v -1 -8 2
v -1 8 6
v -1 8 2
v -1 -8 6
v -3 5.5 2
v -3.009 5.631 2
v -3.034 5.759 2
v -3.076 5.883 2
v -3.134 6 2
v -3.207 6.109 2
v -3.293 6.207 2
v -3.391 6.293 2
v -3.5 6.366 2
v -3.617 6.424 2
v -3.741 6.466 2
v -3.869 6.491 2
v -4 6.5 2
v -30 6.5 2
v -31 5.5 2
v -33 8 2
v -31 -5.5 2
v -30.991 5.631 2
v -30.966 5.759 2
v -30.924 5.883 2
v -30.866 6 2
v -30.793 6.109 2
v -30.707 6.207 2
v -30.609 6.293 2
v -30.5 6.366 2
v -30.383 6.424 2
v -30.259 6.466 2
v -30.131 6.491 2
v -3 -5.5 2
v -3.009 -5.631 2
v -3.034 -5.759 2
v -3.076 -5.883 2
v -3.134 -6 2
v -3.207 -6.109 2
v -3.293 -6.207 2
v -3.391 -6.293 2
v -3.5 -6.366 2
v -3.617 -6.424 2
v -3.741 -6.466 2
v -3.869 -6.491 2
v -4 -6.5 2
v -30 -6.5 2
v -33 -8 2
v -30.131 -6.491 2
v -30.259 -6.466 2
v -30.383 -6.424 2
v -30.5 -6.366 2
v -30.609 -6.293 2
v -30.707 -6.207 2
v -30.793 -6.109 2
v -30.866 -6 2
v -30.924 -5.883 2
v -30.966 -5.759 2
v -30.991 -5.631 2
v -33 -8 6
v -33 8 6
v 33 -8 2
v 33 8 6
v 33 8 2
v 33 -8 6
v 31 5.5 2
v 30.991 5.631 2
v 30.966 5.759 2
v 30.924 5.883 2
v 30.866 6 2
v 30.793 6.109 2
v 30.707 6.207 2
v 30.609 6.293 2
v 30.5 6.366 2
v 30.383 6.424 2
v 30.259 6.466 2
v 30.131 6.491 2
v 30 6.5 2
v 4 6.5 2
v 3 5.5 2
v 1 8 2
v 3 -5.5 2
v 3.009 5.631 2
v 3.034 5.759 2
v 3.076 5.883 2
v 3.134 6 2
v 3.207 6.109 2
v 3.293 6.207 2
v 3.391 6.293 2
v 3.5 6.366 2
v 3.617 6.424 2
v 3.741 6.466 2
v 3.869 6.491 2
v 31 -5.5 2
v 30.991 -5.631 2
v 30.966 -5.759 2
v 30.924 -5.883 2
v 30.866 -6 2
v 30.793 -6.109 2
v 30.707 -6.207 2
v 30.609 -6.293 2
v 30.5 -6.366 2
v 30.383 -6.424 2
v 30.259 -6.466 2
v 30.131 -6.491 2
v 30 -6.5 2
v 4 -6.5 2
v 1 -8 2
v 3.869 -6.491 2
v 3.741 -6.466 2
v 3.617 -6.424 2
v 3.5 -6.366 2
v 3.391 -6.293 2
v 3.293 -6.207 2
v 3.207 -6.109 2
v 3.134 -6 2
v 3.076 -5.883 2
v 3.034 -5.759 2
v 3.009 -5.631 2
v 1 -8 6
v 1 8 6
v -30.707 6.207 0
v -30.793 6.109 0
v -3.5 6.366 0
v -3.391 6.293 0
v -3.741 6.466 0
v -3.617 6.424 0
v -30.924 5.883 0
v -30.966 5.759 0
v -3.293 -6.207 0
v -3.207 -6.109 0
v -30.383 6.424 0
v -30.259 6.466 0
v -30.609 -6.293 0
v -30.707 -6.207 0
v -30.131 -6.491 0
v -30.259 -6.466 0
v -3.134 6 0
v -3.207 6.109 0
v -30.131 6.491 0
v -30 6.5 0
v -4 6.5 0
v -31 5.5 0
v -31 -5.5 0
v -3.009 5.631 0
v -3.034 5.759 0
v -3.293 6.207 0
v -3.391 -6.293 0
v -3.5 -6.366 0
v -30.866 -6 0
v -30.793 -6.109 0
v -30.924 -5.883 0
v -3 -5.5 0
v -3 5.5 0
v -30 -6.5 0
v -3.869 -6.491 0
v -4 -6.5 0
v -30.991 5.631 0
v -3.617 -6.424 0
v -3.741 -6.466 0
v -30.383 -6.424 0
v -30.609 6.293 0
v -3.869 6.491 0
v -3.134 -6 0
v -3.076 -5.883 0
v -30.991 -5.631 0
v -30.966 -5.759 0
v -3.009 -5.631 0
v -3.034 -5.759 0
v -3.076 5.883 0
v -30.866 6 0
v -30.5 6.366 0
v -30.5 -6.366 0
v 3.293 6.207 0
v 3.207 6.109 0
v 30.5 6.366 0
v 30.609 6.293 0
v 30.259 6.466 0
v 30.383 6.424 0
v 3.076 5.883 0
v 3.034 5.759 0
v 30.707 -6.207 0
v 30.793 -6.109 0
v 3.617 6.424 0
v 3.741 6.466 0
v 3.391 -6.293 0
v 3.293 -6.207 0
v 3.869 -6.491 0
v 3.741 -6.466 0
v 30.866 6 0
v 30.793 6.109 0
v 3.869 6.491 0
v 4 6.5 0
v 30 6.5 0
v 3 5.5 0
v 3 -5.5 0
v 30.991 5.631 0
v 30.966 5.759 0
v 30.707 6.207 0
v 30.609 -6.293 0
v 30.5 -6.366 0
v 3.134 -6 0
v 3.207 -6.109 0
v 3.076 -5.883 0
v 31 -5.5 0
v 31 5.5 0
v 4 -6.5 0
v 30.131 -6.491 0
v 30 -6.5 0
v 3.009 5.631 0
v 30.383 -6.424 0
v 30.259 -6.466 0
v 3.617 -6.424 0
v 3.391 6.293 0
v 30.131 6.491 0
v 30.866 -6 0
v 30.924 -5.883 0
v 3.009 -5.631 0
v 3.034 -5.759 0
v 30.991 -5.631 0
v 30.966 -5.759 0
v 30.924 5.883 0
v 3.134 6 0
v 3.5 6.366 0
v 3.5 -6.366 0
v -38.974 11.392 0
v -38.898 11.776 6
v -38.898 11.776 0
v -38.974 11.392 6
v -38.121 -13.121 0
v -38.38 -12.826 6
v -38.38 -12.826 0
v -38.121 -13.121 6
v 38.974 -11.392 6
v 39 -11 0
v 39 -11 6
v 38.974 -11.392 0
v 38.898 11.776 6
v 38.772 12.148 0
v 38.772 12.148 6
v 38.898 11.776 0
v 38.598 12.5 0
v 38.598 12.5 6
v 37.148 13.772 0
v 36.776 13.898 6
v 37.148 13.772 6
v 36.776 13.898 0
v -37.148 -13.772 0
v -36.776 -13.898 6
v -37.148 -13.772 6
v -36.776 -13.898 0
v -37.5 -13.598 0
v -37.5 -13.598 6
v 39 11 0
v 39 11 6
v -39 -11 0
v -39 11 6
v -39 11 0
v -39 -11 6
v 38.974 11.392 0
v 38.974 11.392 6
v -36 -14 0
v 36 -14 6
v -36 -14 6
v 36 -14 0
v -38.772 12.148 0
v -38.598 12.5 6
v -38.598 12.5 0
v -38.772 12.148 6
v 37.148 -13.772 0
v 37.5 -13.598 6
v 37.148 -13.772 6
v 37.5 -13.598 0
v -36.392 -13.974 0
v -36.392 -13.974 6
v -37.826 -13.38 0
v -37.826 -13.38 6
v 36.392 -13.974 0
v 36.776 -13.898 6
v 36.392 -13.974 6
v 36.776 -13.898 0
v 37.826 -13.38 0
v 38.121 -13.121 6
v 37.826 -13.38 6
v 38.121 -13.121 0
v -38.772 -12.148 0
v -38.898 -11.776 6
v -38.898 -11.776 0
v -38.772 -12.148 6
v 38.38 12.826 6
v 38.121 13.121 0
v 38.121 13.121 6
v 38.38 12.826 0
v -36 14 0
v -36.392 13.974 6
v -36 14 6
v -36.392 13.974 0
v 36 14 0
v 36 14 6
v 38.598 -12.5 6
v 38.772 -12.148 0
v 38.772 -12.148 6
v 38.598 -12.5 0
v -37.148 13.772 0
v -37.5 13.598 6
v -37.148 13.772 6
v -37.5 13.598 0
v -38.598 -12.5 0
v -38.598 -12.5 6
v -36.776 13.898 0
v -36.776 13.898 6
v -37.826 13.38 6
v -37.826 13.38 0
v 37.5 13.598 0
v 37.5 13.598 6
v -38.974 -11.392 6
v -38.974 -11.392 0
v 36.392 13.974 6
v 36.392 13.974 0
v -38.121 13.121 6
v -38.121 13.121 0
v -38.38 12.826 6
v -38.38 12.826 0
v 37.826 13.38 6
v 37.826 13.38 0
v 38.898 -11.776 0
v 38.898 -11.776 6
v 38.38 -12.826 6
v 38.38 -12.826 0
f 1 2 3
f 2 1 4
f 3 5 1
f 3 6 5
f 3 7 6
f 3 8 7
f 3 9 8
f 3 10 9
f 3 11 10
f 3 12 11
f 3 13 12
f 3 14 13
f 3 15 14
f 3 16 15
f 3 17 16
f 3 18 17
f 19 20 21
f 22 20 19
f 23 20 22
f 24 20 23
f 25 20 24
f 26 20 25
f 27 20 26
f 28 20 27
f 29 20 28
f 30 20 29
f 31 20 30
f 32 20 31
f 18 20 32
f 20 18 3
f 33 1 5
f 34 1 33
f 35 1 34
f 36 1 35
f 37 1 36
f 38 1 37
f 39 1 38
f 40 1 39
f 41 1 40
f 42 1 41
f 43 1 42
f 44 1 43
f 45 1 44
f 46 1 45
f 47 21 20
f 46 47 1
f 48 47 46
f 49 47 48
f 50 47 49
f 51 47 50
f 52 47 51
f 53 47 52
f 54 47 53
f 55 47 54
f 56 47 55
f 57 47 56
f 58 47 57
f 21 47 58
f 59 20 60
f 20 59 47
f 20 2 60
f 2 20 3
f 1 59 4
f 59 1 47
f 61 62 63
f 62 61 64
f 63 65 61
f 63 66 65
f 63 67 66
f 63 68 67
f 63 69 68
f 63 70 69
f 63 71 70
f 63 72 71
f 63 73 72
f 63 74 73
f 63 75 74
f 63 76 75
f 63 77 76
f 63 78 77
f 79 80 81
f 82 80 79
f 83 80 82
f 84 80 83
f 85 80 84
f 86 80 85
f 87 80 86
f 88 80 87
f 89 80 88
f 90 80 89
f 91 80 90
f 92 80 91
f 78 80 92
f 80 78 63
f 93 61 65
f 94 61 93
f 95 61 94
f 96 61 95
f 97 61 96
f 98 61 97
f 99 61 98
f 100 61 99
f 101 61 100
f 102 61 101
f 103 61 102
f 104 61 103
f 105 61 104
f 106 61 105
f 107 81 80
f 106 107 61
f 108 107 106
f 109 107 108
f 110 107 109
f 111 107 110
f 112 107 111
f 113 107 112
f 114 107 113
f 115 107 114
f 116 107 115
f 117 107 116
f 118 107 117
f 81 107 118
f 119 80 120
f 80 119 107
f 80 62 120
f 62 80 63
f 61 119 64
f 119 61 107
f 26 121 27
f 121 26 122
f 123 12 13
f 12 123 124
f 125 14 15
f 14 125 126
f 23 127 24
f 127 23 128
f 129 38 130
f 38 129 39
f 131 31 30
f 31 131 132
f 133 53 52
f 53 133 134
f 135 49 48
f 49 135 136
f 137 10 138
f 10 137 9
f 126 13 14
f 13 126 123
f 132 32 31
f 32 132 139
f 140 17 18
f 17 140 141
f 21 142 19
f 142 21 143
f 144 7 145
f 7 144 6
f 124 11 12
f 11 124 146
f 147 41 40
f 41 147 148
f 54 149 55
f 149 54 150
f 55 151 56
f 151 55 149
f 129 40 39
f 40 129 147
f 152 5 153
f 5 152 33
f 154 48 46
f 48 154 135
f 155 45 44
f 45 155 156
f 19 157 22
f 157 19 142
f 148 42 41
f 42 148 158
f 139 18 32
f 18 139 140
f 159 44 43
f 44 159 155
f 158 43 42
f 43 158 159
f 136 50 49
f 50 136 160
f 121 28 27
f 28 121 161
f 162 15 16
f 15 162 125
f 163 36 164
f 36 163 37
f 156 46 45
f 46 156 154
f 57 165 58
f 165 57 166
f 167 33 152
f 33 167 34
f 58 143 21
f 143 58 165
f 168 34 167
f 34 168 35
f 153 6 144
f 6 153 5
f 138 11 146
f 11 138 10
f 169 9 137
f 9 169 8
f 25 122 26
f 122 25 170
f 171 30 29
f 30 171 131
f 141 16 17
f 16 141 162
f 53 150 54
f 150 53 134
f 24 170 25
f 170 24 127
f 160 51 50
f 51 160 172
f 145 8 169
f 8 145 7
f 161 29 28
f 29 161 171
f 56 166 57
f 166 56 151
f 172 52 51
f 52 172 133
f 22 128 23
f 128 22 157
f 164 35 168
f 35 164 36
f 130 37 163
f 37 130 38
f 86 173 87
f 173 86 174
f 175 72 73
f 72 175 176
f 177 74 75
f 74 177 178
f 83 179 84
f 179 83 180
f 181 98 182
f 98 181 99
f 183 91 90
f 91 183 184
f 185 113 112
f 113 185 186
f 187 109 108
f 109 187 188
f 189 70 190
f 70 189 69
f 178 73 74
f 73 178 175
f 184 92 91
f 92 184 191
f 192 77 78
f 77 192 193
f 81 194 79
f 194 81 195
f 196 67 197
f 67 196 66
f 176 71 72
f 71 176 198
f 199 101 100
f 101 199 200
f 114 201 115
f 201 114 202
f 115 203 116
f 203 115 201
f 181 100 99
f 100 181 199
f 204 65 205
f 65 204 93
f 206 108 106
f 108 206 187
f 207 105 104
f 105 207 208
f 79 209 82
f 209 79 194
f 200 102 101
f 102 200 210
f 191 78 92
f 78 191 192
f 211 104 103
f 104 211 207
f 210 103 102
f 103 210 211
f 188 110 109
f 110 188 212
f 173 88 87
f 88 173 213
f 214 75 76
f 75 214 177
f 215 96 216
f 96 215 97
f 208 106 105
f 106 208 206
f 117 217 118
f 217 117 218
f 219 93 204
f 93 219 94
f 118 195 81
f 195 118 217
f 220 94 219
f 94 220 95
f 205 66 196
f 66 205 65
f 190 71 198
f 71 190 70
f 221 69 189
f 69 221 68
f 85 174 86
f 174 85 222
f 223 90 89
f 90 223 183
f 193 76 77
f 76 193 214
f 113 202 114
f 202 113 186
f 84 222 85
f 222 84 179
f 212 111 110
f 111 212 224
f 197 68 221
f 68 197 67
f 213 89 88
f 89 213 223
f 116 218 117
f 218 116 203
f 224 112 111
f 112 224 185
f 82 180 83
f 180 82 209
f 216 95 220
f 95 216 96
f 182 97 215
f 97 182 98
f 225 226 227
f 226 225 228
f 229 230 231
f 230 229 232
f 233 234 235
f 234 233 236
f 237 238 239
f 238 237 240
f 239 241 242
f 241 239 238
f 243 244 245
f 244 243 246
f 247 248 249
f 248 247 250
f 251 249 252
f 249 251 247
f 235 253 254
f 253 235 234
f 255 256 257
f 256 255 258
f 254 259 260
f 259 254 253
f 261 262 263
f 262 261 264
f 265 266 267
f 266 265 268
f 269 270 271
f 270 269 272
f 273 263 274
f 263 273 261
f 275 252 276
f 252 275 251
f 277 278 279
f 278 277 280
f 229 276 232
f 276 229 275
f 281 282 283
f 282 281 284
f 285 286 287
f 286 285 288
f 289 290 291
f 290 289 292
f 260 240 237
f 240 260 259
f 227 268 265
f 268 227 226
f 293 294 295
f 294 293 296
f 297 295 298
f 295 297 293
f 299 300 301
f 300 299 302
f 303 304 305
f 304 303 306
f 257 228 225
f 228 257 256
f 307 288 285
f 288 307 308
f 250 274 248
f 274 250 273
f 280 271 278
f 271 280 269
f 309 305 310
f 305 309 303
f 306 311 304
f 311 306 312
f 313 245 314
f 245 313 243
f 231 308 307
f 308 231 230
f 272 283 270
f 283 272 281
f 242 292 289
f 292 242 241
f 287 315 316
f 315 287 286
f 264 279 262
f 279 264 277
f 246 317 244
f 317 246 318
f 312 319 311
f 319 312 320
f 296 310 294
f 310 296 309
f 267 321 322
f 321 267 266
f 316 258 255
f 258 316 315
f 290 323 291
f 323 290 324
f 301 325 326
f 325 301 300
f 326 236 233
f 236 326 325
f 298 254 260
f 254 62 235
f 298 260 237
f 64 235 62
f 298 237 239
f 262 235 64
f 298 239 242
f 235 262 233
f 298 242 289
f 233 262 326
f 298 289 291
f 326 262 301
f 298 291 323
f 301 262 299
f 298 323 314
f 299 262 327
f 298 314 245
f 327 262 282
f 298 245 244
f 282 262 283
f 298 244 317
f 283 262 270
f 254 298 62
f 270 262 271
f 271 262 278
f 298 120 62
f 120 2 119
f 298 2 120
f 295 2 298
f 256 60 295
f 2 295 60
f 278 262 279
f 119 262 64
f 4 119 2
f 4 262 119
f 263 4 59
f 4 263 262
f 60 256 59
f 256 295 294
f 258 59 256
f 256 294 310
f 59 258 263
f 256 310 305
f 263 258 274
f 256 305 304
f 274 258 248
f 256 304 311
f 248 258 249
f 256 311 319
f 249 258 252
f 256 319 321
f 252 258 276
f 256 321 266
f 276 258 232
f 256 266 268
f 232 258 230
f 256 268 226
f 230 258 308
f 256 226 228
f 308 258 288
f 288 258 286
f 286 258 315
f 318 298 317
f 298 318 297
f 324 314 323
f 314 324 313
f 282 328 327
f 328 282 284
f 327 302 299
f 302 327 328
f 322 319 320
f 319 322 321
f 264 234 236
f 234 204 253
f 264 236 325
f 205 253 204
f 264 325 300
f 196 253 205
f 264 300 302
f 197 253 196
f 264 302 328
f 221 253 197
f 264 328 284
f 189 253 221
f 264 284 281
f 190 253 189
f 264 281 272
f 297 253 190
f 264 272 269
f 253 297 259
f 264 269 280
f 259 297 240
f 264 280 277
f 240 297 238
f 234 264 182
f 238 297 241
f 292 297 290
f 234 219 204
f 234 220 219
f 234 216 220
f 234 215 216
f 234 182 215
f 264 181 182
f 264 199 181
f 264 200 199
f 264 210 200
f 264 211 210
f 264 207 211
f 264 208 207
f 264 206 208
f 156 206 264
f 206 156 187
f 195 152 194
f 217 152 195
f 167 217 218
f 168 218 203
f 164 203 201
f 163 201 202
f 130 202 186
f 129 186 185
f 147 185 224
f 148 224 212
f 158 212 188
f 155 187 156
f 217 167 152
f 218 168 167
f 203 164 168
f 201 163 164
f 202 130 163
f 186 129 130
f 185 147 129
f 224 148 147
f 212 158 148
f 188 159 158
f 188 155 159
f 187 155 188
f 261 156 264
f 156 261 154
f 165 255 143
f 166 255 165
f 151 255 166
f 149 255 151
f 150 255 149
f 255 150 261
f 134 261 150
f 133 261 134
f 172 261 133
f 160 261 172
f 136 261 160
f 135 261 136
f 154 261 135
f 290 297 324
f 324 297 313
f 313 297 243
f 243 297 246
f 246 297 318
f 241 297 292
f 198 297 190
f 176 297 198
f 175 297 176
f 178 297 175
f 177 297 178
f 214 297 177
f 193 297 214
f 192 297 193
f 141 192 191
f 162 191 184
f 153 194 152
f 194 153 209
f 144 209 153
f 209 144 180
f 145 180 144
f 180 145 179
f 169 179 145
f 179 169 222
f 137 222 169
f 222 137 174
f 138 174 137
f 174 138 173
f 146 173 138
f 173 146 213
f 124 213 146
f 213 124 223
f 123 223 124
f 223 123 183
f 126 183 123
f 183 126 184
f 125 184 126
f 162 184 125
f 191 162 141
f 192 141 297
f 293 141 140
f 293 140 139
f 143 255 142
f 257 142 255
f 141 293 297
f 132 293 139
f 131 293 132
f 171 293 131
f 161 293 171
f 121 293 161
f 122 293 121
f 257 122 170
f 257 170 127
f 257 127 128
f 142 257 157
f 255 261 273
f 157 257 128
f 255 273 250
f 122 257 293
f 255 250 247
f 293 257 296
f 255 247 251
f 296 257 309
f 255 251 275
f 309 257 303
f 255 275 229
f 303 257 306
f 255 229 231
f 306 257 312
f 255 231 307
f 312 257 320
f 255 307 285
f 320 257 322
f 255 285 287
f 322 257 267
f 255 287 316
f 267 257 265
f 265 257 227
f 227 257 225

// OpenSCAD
// file: parameters.scad
// ============================================
// MODULAR CABLE ORGANIZER - SHARED PARAMETERS
// ============================================
// All dimensions in mm - include this in all files
// ============================================

$fn = 48;

// === TOLERANCES ===
clearance = 0.3;
port_clearance = 0.1;  // Extra clearance for port openings (reduced - 0.2 was too loose for USB-C)
wall = 1.6;

// === SLOT DIMENSIONS (2:1 aspect ratio) - scaled to 2/3 ===
slot_width = 32;  // Standard wide slot for larger connectors
slot_width_narrow = 16;  // Narrow slot for compact connectors (USB-C, micro-USB, USB-A, Lightning, 3.5mm)
slot_height = 16;  // Height is same for both wide and narrow
slot_depth = 4;  // Reduced from 6mm - less frame depth needed

// === FRAME STRUCTURE ===
frame_wall = 2.0;   // Wall between slots - 6 layers @ 0.4mm nozzle for strength
frame_border = 6;  // Increased by 10mm for mounting holes with countersink
frame_back = 2;     // Slightly thicker for snap catch strength
mount_hole_dia = 4;  // M4 mounting holes (changed from M3 for common screw sizes)
countersink_dia = 8;  // Diameter of countersink for M4 screw heads
countersink_depth = 2;  // Depth of countersink

// === DEFAULT GRID (can be overridden in individual files) ===
grid_cols = 2;
grid_rows = 2;

// === INSERT BASE DIMENSIONS ===
insert_width = slot_width - (2 * clearance);
insert_height = slot_height - (2 * clearance);
insert_base_depth = slot_depth - 0.5;

// === NARROW INSERT BASE DIMENSIONS ===
insert_width_narrow = slot_width_narrow - (2 * clearance);
insert_height_narrow = slot_height - (2 * clearance);

// === INSERT BODY (protrudes from frame) ===
insert_body_width = insert_width - 4;
insert_body_height = insert_height - 3;
insert_body_depth = 15.5;  // Standardized depth (USB-B 15.26mm + 0.25mm buffer) - all inserts same height
insert_top_thick = 1.5;  // Top platform thickness

// === NARROW INSERT BODY (protrudes from frame) ===
insert_body_width_narrow = insert_width_narrow - 4;
insert_body_height_narrow = insert_height_narrow - 3;

// === SNAP TABS (on neck/body - catch on back plate) ===
snap_tab_width = 4;
snap_tab_protrude = 1.2;  // How far tab sticks out from body
snap_tab_thick = 1.5;     // Z thickness of tab
snap_tab_offset = 2.2;      // Distance from base to tab bottom on insert (increased to clear frame)

// === CONNECTOR PORT DIMENSIONS & BODY DEPTHS ===
// Port dimensions from reference blueprints
// Body depths sized to match typical male connector lengths

// USB-C: 8.4 x 2.6mm, male connector ~9mm
usbc_w = 8.4;
usbc_h = 2.6;
usbc_r = 1.0;
usbc_body_depth = 15.5;  // Standardized depth (USB-B 15.26mm + 0.25mm buffer)
// NO RETENTION RIBS for USB-C (removed per user request)

// USB-A: 13.0 x 4.5mm (standard male USB-A height)
usba_w = 13.0;
usba_h = 4.5;  // Match actual male USB-A height
usba_r = 0.5;
usba_body_depth = 15.5;  // Standardized depth (USB-B 15.26mm + 0.25mm buffer)
usba_retention_rib_depth = 5.0;  // Distance from front (moved back 1mm so ribs don't break)
usba_retention_rib_size = 0.15;  // How far ribs protrude inward

// USB Mini: 6.9 x 3.0mm, male connector ~9mm
usb_mini_w = 6.9;
usb_mini_h = 3.0;
usb_mini_r = 0.5;
usb_mini_body_depth = 15.5;  // Standardized depth (USB-B 15.26mm + 0.25mm buffer)
usb_mini_retention_rib_depth = 3.5;  // Distance from front where retention ribs start
usb_mini_retention_rib_size = 0.125;  // Reduced to half (was 0.25)

// USB Micro-B: 7.4 x 1.8mm (wider to fit corners of trapezoid)
usb_micro_w = 7.4;  // Increased width for corners
usb_micro_h = 1.8;
usb_micro_r = 0.3;
usb_micro_body_depth = 15.5;  // Standardized depth (USB-B 15.26mm + 0.25mm buffer)
usb_micro_retention_rib_depth = 4.5;  // Distance from front (moved back 1mm so ribs don't break)
usb_micro_retention_rib_size = 0.125;  // How far ribs protrude inward

// USB-B: 8.75 x 7.78mm (standard male USB-B height)
usb_b_w = 8.75;  // Width at bottom (wider)
usb_b_h = 7.78;  // Match actual male USB-B height (reduced from 7.9)
usb_b_r = 0.6;   // Corner radius
usb_b_top_inset = 0.9;  // How much narrower the top is (creates trapezoid shape)
usb_b_body_depth = 15.5;  // Standardized depth (15.26mm connector + 0.25mm buffer)
usb_b_retention_rib_depth = 5.5;  // Distance from front (moved back 1mm so ribs don't break)
usb_b_retention_rib_size = 0.15;  // How far ribs protrude inward

// Lightning: 7.6 x 1.5mm, male connector ~8mm (measured from actual connector)
lightning_w = 7.6;
lightning_h = 1.5;
lightning_r = 0.5;
lightning_body_depth = 15.5;  // Standardized depth (USB-B 15.26mm + 0.25mm buffer)
lightning_retention_rib_depth = 4.0;  // Distance from front (moved back 1mm so ribs don't break)
lightning_retention_rib_size = 0.1;   // How far ribs protrude inward

// HDMI: 14.65 x 4.45mm (standard male HDMI height)
hdmi_w = 14.65;
hdmi_h = 4.45;  // Match actual male HDMI height
hdmi_r = 0.5;
hdmi_body_depth = 15.5;  // Standardized depth (USB-B 15.26mm + 0.25mm buffer)
hdmi_retention_rib_depth = 6.0;  // Distance from front (moved back 1mm so ribs don't break)
hdmi_retention_rib_size = 0.1;   // How far ribs protrude inward

// 3.5mm Audio Jack: standard 3.5mm (1/8") diameter
audio_jack_dia = 3.6;  // 3.5mm + 0.1mm for less snug fit
audio_jack_body_depth = 15.5;  // Standardized depth (USB-B 15.26mm + 0.25mm buffer)
// Ring positions for TRS/TRRS ribs (tip, ring1, ring2 from front)
audio_jack_ring1 = 3.5;  // First ring position from front
audio_jack_ring2 = 6.5;  // Second ring position from front

// Blank/Label: recessed area for label
label_w = 30;
label_h = 12;
label_depth = 0.8;

// Keyhole mounting slot: picture-hanger style for wall/table mounting
// The keyhole allows a round-headed screw to pass through, then lock in slot
keyhole_head_dia = 6;   // Diameter for screw head to pass through (5% narrower, fits #6-#8 wood screws)
keyhole_slot_width = 3.5; // Width of slot for screw shaft
keyhole_slot_length = 5.3; // Travel distance to lock screw in place
keyhole_depth = 2.5;      // Depth of keyhole cut (allows screw head to sit below surface)

// AC Power Plug: asymmetric holes for polarity (US 2-prong)
// Prongs are VERTICAL (tall and thin)
// Hot prong (narrower): 1.6mm wide x 6.5mm tall
// Neutral prong (wider): 1.6mm wide x 8.5mm tall (increased)
power_hot_w = 1.6;   // Width (thin dimension)
power_hot_h = 6.5;   // Height (tall dimension)
power_neutral_w = 1.6;   // Width (thin dimension)
power_neutral_h = 8.5;   // Height (tall dimension, increased from 8.1)
power_prong_spacing = 12.7;  // 0.5" center-to-center
power_body_depth = 15.5;  // Standardized depth (USB-B 15.26mm + 0.25mm buffer)

// === CALCULATED VALUES ===
frame_total_depth = frame_back + slot_depth;
grid_width = (grid_cols * slot_width) + ((grid_cols - 1) * frame_wall);
grid_height = (grid_rows * slot_height) + ((grid_rows - 1) * frame_wall);
frame_width = grid_width + (2 * frame_border);
frame_height_total = grid_height + (2 * frame_border);
insert_total_depth = insert_base_depth + insert_body_depth;
// main file
// ============================================
// FRAME WALL THICKNESS TEST
// ============================================
// This file demonstrates the wall thickness between slots
// and validates clearances for inserts
// ============================================

include <parameters.scad>
include <insert_base.scad>

// === TEST LAYOUT ===
// Shows 2 adjacent slots with wall between them to verify thickness
module wall_test() {
    difference() {
        union() {
            // Create a small frame section with 2 slots side-by-side (1x2 grid)
            local_grid_width = (2 * slot_width) + frame_wall;
            local_frame_width = local_grid_width + (2 * frame_border);
            local_frame_height = slot_height + (2 * frame_border);
            
            rounded_box_rect(local_frame_width, local_frame_height, frame_total_depth, 3);
        }
        
        // Cut slots
        for (i = [0, 1]) {
            x = (i - 0.5) * (slot_width + frame_wall);
            translate([x, 0, frame_back + slot_depth/2 + 0.1])
                cube([slot_width, slot_height, slot_depth + 0.2], center=true);
        }
        
        // Back cutouts
        cutout_w = insert_body_width + 2*clearance;
        cutout_h = insert_body_height + 2*clearance;
        for (i = [0, 1]) {
            x = (i - 0.5) * (slot_width + frame_wall);
            translate([x, 0, -0.1])
                rounded_box_rect(cutout_w, cutout_h, frame_back + 0.2, 1);
        }
    }
}

// === TEST WITH INSERTS ===
// Shows the frame with inserts positioned to verify clearances
module test_with_inserts() {
    // Frame section
    wall_test();
    
    // Show two inserts in position (semi-transparent to see clearances)
    #for (i = [0, 1]) {
        x = (i - 0.5) * (slot_width + frame_wall);
        translate([x, 0, 0]) {
            insert_blank();
        }
    }
}

// === MEASUREMENT HELPER ===
// Shows dimensional callouts for verification
module measurement_helper() {
    wall_test();
    
    // Add a text label showing wall thickness
    color("red")
    translate([0, 0, frame_total_depth])
        linear_extrude(0.5)
        text(str("Wall: ", frame_wall, "mm"), 
             size=3, 
             halign="center", 
             valign="center");
}

// === RENDER OPTIONS ===
// Uncomment the one you want to see:

wall_test();              // Basic wall thickness test
// test_with_inserts();     // Test with inserts visible
// measurement_helper();    // Test with dimension label
